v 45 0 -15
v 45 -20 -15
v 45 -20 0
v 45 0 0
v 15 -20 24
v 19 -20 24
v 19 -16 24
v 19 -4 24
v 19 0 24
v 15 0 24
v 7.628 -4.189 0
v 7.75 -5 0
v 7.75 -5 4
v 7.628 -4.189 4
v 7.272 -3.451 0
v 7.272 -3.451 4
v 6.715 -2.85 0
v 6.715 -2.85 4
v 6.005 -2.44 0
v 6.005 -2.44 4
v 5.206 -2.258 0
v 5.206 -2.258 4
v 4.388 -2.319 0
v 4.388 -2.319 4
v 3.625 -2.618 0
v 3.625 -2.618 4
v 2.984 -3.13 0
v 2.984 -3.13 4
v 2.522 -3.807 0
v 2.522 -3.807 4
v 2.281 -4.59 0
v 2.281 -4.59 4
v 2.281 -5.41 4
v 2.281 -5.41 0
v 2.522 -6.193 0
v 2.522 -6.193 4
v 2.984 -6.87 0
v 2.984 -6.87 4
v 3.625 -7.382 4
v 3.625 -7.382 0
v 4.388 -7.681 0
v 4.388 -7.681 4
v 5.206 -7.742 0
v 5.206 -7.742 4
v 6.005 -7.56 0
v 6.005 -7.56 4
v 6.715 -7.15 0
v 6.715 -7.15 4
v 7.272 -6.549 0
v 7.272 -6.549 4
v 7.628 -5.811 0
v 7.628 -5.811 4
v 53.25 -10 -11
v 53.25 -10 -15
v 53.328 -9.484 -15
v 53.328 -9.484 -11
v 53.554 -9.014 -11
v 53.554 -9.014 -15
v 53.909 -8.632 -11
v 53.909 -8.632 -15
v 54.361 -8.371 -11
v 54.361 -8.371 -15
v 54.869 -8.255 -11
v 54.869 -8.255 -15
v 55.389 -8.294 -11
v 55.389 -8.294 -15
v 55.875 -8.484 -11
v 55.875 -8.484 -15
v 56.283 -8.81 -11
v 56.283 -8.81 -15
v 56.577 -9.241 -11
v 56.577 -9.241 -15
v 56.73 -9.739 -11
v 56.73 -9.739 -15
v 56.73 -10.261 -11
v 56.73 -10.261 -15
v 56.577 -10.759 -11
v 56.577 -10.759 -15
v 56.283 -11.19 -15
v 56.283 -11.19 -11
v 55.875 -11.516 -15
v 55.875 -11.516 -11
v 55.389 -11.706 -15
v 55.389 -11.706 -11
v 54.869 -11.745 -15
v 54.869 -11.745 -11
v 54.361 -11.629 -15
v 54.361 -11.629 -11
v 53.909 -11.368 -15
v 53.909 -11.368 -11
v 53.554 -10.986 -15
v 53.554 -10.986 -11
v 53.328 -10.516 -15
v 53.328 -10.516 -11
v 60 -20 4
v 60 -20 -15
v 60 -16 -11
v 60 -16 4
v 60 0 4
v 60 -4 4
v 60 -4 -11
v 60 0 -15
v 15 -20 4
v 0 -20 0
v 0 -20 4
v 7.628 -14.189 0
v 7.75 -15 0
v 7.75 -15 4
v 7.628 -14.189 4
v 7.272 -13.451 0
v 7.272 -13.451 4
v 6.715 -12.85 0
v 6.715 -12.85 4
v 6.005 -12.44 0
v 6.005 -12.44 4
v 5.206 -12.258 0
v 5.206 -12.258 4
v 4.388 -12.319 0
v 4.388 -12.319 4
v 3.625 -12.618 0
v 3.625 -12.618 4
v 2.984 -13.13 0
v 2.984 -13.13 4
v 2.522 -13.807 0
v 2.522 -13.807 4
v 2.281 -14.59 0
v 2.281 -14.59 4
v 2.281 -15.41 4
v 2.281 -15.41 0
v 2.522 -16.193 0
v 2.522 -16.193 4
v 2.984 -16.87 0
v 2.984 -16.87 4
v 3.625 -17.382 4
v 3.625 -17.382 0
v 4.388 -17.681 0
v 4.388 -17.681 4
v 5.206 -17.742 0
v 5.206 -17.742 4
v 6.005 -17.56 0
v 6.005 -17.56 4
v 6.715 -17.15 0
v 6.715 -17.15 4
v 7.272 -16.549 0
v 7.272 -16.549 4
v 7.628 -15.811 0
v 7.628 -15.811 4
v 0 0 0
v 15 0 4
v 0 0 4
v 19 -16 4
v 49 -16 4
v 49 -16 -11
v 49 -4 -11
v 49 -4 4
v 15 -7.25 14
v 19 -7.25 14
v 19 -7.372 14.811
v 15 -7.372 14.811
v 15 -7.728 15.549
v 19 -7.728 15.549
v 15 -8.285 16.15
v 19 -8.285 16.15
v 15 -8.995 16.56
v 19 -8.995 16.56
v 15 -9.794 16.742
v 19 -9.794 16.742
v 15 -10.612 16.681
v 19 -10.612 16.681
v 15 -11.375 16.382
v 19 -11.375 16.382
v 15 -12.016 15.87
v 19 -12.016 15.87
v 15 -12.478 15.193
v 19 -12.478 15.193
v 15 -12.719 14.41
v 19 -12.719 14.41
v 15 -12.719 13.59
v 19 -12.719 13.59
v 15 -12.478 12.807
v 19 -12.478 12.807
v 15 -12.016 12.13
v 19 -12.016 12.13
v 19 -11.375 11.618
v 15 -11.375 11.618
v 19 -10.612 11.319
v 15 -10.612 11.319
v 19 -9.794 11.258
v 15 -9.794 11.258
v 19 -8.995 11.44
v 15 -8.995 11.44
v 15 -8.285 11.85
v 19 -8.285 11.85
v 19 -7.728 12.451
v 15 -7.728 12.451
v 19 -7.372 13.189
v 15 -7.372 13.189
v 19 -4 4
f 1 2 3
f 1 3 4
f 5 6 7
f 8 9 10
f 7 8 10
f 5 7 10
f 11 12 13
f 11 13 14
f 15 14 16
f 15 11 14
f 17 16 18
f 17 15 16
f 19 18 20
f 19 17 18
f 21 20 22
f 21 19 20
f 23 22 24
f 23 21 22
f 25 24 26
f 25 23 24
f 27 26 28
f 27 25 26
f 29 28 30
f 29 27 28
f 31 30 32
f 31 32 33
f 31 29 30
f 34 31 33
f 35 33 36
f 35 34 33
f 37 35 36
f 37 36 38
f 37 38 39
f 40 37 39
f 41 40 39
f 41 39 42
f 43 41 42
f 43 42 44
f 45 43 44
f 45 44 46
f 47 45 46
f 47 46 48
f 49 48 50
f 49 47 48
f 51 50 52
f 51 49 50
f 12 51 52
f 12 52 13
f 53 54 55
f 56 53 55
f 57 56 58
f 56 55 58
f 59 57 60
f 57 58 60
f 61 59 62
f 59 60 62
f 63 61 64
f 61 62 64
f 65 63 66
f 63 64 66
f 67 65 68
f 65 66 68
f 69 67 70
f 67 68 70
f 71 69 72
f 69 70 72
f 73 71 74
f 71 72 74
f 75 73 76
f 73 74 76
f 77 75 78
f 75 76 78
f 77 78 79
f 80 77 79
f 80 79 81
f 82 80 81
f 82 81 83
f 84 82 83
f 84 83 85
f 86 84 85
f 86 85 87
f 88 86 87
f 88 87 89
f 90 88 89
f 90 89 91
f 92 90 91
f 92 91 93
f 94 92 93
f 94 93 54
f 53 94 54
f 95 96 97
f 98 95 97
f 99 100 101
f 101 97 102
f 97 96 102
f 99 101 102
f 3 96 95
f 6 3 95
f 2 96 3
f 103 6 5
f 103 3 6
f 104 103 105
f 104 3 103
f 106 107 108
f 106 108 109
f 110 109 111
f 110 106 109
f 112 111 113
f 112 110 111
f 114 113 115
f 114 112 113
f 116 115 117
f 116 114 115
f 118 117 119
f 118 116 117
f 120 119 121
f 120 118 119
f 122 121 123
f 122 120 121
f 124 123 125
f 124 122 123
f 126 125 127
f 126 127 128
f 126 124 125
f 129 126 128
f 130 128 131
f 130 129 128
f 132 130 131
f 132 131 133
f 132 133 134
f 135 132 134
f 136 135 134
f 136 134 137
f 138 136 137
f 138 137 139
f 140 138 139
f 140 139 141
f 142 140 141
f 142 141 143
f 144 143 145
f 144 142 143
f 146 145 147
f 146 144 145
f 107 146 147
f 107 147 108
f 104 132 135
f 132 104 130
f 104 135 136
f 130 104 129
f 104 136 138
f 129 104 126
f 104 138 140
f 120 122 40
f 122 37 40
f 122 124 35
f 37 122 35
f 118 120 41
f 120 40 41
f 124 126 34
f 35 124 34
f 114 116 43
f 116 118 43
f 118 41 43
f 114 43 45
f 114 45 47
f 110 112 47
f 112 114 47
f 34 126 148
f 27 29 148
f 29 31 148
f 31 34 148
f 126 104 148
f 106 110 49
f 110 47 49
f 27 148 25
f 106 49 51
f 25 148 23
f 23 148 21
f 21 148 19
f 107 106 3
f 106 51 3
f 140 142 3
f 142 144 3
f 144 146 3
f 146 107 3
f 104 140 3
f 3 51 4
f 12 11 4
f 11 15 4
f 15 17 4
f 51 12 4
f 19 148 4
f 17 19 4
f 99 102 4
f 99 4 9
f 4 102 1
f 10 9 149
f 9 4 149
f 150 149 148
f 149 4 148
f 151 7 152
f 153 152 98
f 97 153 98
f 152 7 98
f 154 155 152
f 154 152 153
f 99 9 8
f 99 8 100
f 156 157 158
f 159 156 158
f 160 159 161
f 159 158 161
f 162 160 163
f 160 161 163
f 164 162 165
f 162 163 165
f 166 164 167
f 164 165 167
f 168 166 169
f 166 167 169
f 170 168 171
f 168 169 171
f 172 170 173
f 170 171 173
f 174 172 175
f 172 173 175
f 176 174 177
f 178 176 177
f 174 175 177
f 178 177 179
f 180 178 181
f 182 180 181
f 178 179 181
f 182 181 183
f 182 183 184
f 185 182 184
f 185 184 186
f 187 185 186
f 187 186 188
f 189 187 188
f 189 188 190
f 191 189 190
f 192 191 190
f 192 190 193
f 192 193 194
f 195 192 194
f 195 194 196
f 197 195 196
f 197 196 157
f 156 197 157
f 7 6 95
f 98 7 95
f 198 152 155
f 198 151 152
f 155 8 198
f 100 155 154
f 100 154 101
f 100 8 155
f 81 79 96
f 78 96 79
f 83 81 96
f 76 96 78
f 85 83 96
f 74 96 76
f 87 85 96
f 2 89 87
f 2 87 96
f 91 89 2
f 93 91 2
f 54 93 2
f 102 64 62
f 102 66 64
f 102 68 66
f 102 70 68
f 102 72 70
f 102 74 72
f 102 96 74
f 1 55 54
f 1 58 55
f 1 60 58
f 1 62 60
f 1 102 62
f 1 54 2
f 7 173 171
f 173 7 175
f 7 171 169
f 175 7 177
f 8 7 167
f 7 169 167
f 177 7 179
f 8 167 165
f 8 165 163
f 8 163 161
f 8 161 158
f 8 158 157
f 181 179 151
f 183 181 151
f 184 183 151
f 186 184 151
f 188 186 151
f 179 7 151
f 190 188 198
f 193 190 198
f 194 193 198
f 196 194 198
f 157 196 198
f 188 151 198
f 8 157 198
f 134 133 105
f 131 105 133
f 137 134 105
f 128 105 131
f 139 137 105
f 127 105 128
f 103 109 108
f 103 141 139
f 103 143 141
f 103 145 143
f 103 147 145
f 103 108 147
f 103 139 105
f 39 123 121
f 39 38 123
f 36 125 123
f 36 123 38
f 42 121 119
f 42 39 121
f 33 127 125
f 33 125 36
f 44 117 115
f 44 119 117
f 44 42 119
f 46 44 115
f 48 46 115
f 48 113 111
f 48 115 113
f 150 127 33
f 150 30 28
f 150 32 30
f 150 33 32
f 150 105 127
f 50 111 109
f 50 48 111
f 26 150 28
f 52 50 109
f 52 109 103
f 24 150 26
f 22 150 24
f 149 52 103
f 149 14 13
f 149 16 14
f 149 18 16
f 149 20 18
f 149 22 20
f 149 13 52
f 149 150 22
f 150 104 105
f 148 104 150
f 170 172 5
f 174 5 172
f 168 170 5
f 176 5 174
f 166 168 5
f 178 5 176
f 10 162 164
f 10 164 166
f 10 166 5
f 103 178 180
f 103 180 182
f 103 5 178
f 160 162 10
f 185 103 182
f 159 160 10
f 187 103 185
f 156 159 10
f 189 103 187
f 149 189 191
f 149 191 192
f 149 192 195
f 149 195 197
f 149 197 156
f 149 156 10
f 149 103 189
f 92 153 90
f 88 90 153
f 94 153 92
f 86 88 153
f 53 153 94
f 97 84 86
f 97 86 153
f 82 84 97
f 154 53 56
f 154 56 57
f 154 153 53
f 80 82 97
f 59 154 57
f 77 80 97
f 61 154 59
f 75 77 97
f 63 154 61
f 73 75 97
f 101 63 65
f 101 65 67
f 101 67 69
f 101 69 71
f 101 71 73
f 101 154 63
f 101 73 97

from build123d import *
from build123d.topology import SkipClean

# Parameters (mm, degrees)
SKETCH_1_W          = 60
SKETCH_1_H          = 20
SKETCH_1_R          = 2.75
SKETCH_1_R_2        = 1.75
EXTRUDE_1_DEPTH     = 4
SKETCH_2_W          = 4
SKETCH_2_H          = 20
EXTRUDE_2_DEPTH     = 24
EXTRUDE_3_DEPTH     = 4
EXTRUDE_4_DEPTH     = 4
EXTRUDE_START       = 15
SKETCH_5_W          = 45
SKETCH_5_H          = 20
SKETCH_5_R          = 1.75
EXTRUDE_5_DEPTH     = 15
SKETCH_6_W          = 40
SKETCH_6_H          = 12
CUT_EXTRUDE_1_DEPTH = 15
SKETCH_7_R          = 2.75
CUT_EXTRUDE_2_DEPTH = 15
CUT_EXTRUDE_3_REACH = 76.303
SKETCH_8_W          = 30
SKETCH_8_H          = 20
SKETCH_10_W         = 26
SKETCH_10_H         = 12
EXTRUDE_6_DEPTH     = 4
SKETCH_11_W         = 15
SKETCH_11_H         = 12
EXTRUDE_7_DEPTH     = 4


with BuildPart() as part:
    # 草图1 → 凸台-拉伸1 (new body)
    with BuildSketch(Plane.XY):
        with Locations((30, -10)):
            Rectangle(SKETCH_1_W, SKETCH_1_H)
        with Locations((5, -5)):
            Circle(SKETCH_1_R, mode=Mode.SUBTRACT)
        with Locations((5, -15)):
            Circle(SKETCH_1_R, mode=Mode.SUBTRACT)
        with Locations((55, -10)):
            Circle(SKETCH_1_R_2, mode=Mode.SUBTRACT)
    extrude(amount=EXTRUDE_1_DEPTH)

    # 草图2 → 凸台-拉伸2 (add)
    with BuildSketch(Plane(origin=(0, 0, 0), x_dir=(-1, 0, 0), z_dir=(0, 0, -1))):
        with Locations((-17, -10)):
            Rectangle(SKETCH_2_W, SKETCH_2_H)
    extrude(amount=-EXTRUDE_2_DEPTH)

    # 草图3 → 凸台-拉伸3 (add)
    with BuildSketch(Plane.XZ.offset(20)):
        Polygon((19, 24), (60, 4), (19, 4), align=None)
    extrude(amount=-EXTRUDE_3_DEPTH)

    # 草图4 → 凸台-拉伸4 (add)
    with BuildSketch(Plane(origin=(0, 0, 0), x_dir=(1, 0, 0), z_dir=(0, 1, 0))):
        Polygon((19, -24), (60, -4), (19, -4), align=None)
    extrude(amount=-EXTRUDE_4_DEPTH)

    # 草图5 → 凸台-拉伸5 (add)
    with SkipClean():  # the faces are left unmerged after this step: merging them gives an invalid solid
        with BuildSketch(Plane(origin=(0, 0, 0), x_dir=(-1, 0, 0), z_dir=(0, 0, -1)).offset(EXTRUDE_START)):
            with Locations((-37.5, -10)):
                Rectangle(SKETCH_5_W, SKETCH_5_H)
            with Locations((-55, -10)):
                Circle(SKETCH_5_R, mode=Mode.SUBTRACT)
        extrude(amount=-EXTRUDE_5_DEPTH)

    # 草图6 → 切除-拉伸1 (cut)
    with BuildSketch(Plane.XY.offset(4)):
        with Locations((40, -10)):
            Rectangle(SKETCH_6_W, SKETCH_6_H)
    extrude(amount=-CUT_EXTRUDE_1_DEPTH, mode=Mode.SUBTRACT)

    # 草图7 → 切除-拉伸2 (cut)
    with BuildSketch(Plane(origin=(19, 0, 0), x_dir=(0, 0, -1), z_dir=(1, 0, 0))):
        with Locations(Location((-14, -10, 0), (0, 0, 90))):
            Circle(SKETCH_7_R)
    extrude(amount=-CUT_EXTRUDE_2_DEPTH, mode=Mode.SUBTRACT)

    # 切除-拉伸3: up to this face of the body (flat: up to its plane)
    cut_extrude_3_end = Plane(part.part.faces().sort_by_distance((7.970492187, -10, 0))[0])
    # 草图8 → 切除-拉伸3 (cut, up to the picked face)
    with BuildSketch(Plane(origin=(0, 0, -15), x_dir=(-1, 0, 0), z_dir=(0, 0, -1)), mode=Mode.PRIVATE) as cut_extrude_3_sk1:
        with Locations((-30, -10)):
            Rectangle(SKETCH_8_W, SKETCH_8_H)
    cut_extrude_3_tool1 = split(extrude(cut_extrude_3_sk1.sketch, amount=-CUT_EXTRUDE_3_REACH, mode=Mode.PRIVATE), bisect_by=cut_extrude_3_end, keep=Keep.BOTH, mode=Mode.PRIVATE)
    add(cut_extrude_3_tool1.solids().sort_by(Axis((30, -10, -15), (0, 0, 1)))[0], mode=Mode.SUBTRACT)

    # 草图10 → 凸台-拉伸6 (add)
    with BuildSketch(Plane.XY.offset(4)):
        with Locations((32, -10)):
            Rectangle(SKETCH_10_W, SKETCH_10_H)
    extrude(amount=-EXTRUDE_6_DEPTH)

    # 草图11 → 凸台-拉伸7 (add)
    with BuildSketch(Plane(origin=(45, 0, 0), x_dir=(0, 0, -1), z_dir=(1, 0, 0))):
        with Locations((3.5, -10)):
            Rectangle(SKETCH_11_W, SKETCH_11_H)
    extrude(amount=EXTRUDE_7_DEPTH)


solid = part.part
